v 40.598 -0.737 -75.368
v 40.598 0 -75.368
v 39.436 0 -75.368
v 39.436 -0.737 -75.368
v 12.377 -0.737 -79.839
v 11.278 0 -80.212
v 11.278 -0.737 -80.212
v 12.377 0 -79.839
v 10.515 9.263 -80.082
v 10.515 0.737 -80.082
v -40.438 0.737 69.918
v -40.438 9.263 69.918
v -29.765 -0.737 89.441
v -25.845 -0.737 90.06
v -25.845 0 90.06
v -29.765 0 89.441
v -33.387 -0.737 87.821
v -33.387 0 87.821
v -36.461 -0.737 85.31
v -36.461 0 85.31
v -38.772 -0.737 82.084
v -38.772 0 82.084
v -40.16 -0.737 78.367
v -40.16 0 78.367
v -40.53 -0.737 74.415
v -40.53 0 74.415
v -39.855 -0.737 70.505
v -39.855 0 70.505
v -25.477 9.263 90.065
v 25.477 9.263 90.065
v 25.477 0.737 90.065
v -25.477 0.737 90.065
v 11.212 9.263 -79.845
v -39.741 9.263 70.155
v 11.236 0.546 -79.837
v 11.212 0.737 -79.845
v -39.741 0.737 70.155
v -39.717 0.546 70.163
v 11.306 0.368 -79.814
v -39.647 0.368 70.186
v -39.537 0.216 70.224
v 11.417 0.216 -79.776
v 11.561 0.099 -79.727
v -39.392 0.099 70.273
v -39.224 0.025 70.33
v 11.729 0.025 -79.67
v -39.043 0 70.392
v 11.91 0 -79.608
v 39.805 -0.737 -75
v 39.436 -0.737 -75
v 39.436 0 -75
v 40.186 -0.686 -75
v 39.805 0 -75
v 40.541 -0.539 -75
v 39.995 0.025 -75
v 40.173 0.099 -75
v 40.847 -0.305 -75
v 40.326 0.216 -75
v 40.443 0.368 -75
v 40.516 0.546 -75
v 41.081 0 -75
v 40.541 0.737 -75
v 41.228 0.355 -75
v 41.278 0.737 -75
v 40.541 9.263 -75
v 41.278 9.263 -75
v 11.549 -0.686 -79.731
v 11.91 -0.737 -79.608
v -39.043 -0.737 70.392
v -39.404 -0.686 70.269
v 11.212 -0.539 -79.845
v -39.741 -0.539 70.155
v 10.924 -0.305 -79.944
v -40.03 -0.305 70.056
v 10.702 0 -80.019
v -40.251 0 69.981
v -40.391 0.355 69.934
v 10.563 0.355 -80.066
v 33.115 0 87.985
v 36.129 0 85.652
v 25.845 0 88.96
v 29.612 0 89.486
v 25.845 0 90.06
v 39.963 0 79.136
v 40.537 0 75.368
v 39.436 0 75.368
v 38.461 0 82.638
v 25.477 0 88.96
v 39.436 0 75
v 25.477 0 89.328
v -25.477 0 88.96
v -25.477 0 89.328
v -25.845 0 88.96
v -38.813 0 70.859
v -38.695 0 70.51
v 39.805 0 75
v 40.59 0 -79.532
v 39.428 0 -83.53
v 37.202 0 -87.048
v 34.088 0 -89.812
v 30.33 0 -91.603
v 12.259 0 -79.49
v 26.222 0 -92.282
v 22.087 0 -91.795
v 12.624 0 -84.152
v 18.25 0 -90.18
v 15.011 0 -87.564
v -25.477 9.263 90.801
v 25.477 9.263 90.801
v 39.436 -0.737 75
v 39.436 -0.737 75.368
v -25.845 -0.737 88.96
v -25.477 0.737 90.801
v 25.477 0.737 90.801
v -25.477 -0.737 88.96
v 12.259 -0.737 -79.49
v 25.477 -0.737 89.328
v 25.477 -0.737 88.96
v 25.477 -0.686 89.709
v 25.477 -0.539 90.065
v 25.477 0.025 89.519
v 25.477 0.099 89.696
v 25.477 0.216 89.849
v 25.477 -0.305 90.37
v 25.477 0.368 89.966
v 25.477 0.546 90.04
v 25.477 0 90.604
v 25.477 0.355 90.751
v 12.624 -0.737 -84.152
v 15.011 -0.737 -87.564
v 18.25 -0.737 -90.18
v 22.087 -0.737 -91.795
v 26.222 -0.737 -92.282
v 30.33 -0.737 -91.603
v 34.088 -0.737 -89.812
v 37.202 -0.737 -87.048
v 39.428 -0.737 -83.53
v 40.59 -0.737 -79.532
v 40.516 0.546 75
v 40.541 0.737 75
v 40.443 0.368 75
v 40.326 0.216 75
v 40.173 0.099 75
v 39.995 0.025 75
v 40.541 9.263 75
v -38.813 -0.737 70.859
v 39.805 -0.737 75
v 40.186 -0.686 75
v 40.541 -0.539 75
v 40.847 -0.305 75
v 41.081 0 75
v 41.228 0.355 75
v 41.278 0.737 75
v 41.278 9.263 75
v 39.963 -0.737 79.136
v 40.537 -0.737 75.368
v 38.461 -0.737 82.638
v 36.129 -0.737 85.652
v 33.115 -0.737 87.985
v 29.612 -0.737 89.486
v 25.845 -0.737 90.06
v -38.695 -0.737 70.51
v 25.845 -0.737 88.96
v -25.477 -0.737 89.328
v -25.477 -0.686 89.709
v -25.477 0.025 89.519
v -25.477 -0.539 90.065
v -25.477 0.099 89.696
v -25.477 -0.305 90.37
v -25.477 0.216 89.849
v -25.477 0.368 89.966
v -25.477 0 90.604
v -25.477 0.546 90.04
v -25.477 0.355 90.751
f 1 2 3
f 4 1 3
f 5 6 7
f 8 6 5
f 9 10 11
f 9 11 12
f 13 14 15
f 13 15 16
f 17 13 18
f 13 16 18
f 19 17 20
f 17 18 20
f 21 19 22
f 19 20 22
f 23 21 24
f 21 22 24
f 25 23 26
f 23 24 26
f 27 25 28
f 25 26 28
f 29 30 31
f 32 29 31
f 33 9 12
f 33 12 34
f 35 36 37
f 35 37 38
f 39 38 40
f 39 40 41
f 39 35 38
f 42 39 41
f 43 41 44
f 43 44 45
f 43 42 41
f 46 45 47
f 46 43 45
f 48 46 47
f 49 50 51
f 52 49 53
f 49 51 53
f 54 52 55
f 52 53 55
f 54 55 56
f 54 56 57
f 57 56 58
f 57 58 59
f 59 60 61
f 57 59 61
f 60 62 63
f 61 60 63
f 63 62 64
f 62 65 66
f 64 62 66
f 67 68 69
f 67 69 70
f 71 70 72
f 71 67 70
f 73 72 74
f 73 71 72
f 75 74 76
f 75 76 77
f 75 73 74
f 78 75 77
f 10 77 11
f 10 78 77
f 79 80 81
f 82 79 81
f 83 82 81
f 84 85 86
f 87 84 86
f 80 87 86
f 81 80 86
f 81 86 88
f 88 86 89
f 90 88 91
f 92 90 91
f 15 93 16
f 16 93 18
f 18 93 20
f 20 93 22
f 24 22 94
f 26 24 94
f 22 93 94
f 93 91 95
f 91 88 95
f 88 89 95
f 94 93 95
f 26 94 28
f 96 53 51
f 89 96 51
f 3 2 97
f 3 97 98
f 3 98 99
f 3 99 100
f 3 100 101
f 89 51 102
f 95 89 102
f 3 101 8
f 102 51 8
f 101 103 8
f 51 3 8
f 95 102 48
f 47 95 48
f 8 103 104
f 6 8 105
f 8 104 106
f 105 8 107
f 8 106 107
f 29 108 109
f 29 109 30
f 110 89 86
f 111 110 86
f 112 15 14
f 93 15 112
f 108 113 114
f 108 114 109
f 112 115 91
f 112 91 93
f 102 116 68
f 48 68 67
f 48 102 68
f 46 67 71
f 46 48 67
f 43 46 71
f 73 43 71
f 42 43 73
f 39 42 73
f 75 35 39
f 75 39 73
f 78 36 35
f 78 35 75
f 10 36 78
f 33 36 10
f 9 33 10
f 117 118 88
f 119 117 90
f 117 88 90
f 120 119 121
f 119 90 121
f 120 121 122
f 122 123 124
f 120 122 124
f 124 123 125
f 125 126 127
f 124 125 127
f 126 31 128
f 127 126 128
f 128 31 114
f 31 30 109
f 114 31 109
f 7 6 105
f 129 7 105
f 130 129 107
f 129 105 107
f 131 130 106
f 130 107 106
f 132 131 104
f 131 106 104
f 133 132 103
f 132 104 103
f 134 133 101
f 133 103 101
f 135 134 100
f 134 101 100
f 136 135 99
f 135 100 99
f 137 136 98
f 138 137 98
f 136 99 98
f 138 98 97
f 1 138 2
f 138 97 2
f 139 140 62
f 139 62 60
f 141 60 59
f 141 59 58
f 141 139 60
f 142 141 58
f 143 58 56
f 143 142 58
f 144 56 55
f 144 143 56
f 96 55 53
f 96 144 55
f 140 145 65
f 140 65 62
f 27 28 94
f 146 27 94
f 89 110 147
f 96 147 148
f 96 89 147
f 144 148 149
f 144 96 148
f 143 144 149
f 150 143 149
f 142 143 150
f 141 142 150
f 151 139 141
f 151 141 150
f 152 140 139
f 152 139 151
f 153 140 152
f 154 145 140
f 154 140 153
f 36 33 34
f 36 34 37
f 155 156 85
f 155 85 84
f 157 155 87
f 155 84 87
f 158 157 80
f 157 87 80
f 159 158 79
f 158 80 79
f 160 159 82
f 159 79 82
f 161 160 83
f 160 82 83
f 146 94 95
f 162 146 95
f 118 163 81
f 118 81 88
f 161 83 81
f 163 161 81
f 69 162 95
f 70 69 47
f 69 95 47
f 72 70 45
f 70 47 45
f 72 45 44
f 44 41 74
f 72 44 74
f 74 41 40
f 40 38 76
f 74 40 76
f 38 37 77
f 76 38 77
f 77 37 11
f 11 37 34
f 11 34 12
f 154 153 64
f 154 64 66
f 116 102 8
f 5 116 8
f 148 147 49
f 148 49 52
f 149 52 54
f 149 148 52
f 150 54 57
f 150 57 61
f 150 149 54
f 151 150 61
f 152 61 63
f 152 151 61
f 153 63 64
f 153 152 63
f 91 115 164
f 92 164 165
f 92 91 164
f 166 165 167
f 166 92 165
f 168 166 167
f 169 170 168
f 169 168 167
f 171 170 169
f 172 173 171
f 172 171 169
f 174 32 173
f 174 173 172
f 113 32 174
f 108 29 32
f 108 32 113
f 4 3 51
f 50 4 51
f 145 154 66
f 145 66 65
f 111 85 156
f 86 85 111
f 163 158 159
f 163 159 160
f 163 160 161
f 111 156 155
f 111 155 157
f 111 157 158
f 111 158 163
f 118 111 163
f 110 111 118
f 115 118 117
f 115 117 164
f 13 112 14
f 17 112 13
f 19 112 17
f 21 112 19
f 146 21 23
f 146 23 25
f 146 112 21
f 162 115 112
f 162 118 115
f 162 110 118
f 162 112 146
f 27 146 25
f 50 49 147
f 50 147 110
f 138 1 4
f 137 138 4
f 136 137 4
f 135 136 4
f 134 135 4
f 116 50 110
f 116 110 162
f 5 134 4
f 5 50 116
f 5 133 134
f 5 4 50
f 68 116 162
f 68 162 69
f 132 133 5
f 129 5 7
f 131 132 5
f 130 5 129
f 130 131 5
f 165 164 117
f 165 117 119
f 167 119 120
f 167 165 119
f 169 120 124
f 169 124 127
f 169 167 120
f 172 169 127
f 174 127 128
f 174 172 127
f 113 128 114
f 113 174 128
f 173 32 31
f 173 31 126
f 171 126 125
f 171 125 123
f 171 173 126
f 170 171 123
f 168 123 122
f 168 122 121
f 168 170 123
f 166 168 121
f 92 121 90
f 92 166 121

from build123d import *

# Parameters (mm, degrees)
BASE_FLANGE1_DEPTH            = 0.7366
EDGE_FLANGE1_STRIP_W          = 4.4196
EDGE_FLANGE1_STRIP_H          = 0.7366
EDGE_FLANGE1_STRIP_CUT_DEPTH  = 150
EDGE_FLANGE1_RELIEF_W         = 4.7879
EDGE_FLANGE1_RELIEF_H         = 0.3683
EDGE_FLANGE1_RELIEF_CUT_DEPTH = 0.7366
EDGE_FLANGE1_DEPTH            = 150
EDGE_FLANGE2_STRIP_W          = 4.4196
EDGE_FLANGE2_STRIP_H          = 0.7366
EDGE_FLANGE2_STRIP_CUT_DEPTH  = 50.953389831
EDGE_FLANGE2_RELIEF_W         = 4.7879
EDGE_FLANGE2_RELIEF_H         = 0.3683
EDGE_FLANGE2_RELIEF_CUT_DEPTH = 0.7366
EDGE_FLANGE2_DEPTH            = 50.953389831
EDGE_FLANGE3_STRIP_W          = 4.4196
EDGE_FLANGE3_STRIP_H          = 0.7366
EDGE_FLANGE3_STRIP_CUT_DEPTH  = 158.417953324
EDGE_FLANGE3_RELIEF_W         = 4.7879
EDGE_FLANGE3_RELIEF_H         = 0.3683
EDGE_FLANGE3_RELIEF_CUT_DEPTH = 0.7366
EDGE_FLANGE3_DEPTH            = 158.417953324


# Sheet-metal steps are written as plain solids
with BuildPart() as part:
    # Sketch1 → Base-Flange1 (new body)
    with BuildSketch(Plane(origin=(0, 0, 0), x_dir=(1, 0, 0), z_dir=(0, 1, 0))):
        with BuildLine():
            Line((40.54139599, 75), (40.54139599, -75))
            ThreePointArc((40.54139599, -75), (36.129047202, -85.652352287), (25.476694915, -90.064701075))
            Line((25.476694915, -90.064701075), (-25.476694915, -90.064701075))
            ThreePointArc((-25.476694915, -90.064701075), (-37.722911645, -83.773562235), (-39.740893599, -70.154604826))
            Line((-39.740893599, -70.154604826), (11.212496231, 79.845395174))
            ThreePointArc((11.212496231, 79.845395174), (28.299643698, 92.087147467), (40.54139599, 75))
        make_face()
    extrude(amount=-BASE_FLANGE1_DEPTH)

    # Edge-Flange1 strip (across the edge) → Edge-Flange1 strip cut (cut)
    with BuildSketch(Plane(origin=(40.54139599, 0, 75), x_dir=(-1, 0, 0), z_dir=(0, 0, -1))):
        with Locations((-1.4732, -0.3683)):
            Rectangle(EDGE_FLANGE1_STRIP_W, EDGE_FLANGE1_STRIP_H)
    extrude(amount=EDGE_FLANGE1_STRIP_CUT_DEPTH, mode=Mode.SUBTRACT)

    # Edge-Flange1 relief (on the sheet) → Edge-Flange1 relief cut (cut)
    with BuildSketch(Plane(origin=(39.80479599, 0, 75), x_dir=(-1, 0, 0), z_dir=(0, 1, 0))):
        with Locations((-2.02565, 0.18415)):
            Rectangle(EDGE_FLANGE1_RELIEF_W, EDGE_FLANGE1_RELIEF_H)
        with Locations((-2.02565, -150.18415)):
            Rectangle(EDGE_FLANGE1_RELIEF_W, EDGE_FLANGE1_RELIEF_H)
    extrude(amount=-EDGE_FLANGE1_RELIEF_CUT_DEPTH, mode=Mode.SUBTRACT)

    # Edge-Flange1 section (across the edge) → Edge-Flange1 (add)
    with BuildSketch(Plane(origin=(40.54139599, 0, 75), x_dir=(-1, 0, 0), z_dir=(0, 0, -1))):
        with BuildLine():
            Line((-0.7366, 0.7366), (-0.7366, 9.2634))
            Line((-0.7366, 9.2634), (0, 9.2634))
            Line((0, 9.2634), (0, 0.7366))
            ThreePointArc((0, 0.7366), (0.215745145, 0.215745145), (0.7366, 0))
            Line((0.7366, 0), (0.7366, -0.7366))
            ThreePointArc((0.7366, -0.7366), (-0.30510971, -0.30510971), (-0.7366, 0.7366))
        make_face()
    extrude(amount=EDGE_FLANGE1_DEPTH)

    # Edge-Flange2 strip (across the edge) → Edge-Flange2 strip cut (cut)
    with BuildSketch(Plane(origin=(-25.476694915, 0, 90.064701075), x_dir=(0, 0, -1), z_dir=(1, 0, 0))):
        with Locations((-1.4732, -0.3683)):
            Rectangle(EDGE_FLANGE2_STRIP_W, EDGE_FLANGE2_STRIP_H)
    extrude(amount=EDGE_FLANGE2_STRIP_CUT_DEPTH, mode=Mode.SUBTRACT)

    # Edge-Flange2 relief (on the sheet) → Edge-Flange2 relief cut (cut)
    with BuildSketch(Plane(origin=(-25.476694915, 0, 89.328101075), x_dir=(0, 0, -1), z_dir=(0, 1, 0))):
        with Locations((-2.02565, 0.18415)):
            Rectangle(EDGE_FLANGE2_RELIEF_W, EDGE_FLANGE2_RELIEF_H)
        with Locations((-2.02565, -51.137539831)):
            Rectangle(EDGE_FLANGE2_RELIEF_W, EDGE_FLANGE2_RELIEF_H)
    extrude(amount=-EDGE_FLANGE2_RELIEF_CUT_DEPTH, mode=Mode.SUBTRACT)

    # Edge-Flange2 section (across the edge) → Edge-Flange2 (add)
    with BuildSketch(Plane(origin=(-25.476694915, 0, 90.064701075), x_dir=(0, 0, -1), z_dir=(1, 0, 0))):
        with BuildLine():
            Line((-0.7366, 0.7366), (-0.7366, 9.2634))
            Line((-0.7366, 9.2634), (0, 9.2634))
            Line((0, 9.2634), (0, 0.7366))
            ThreePointArc((0, 0.7366), (0.215745145, 0.215745145), (0.7366, 0))
            Line((0.7366, 0), (0.7366, -0.7366))
            ThreePointArc((0.7366, -0.7366), (-0.30510971, -0.30510971), (-0.7366, 0.7366))
        make_face()
    extrude(amount=EDGE_FLANGE2_DEPTH)

    # Edge-Flange3 strip (across the edge) → Edge-Flange3 strip cut (cut)
    with BuildSketch(Plane(origin=(11.212496231, 0, -79.845395174), x_dir=(0.9468623779885023, 3.4914813388431334e-15, 0.3216389857432692), z_dir=(-0.3216389857432692, 0, 0.9468623779885023))):
        with Locations((-1.4732, -0.3683)):
            Rectangle(EDGE_FLANGE3_STRIP_W, EDGE_FLANGE3_STRIP_H)
    extrude(amount=EDGE_FLANGE3_STRIP_CUT_DEPTH, mode=Mode.SUBTRACT)

    # Edge-Flange3 relief (on the sheet) → Edge-Flange3 relief cut (cut)
    with BuildSketch(Plane(origin=(11.909955059, 0, -79.608475897), x_dir=(0.9468623779885023, 6.982962677686267e-15, 0.3216389857432692), z_dir=(0, 1, 0))):
        with Locations((-2.02565, 0.18415)):
            Rectangle(EDGE_FLANGE3_RELIEF_W, EDGE_FLANGE3_RELIEF_H)
        with Locations((-2.02565, -158.602103324)):
            Rectangle(EDGE_FLANGE3_RELIEF_W, EDGE_FLANGE3_RELIEF_H)
    extrude(amount=-EDGE_FLANGE3_RELIEF_CUT_DEPTH, mode=Mode.SUBTRACT)

    # Edge-Flange3 section (across the edge) → Edge-Flange3 (add)
    with BuildSketch(Plane(origin=(11.212496231, 0, -79.845395174), x_dir=(0.9468623779885023, 3.4914813388431334e-15, 0.3216389857432692), z_dir=(-0.3216389857432692, 0, 0.9468623779885023))):
        with BuildLine():
            Line((-0.7366, 0.7366), (-0.7366, 9.2634))
            Line((-0.7366, 9.2634), (0, 9.2634))
            Line((0, 9.2634), (0, 0.7366))
            ThreePointArc((0, 0.7366), (0.215745145, 0.215745145), (0.7366, 0))
            Line((0.7366, 0), (0.7366, -0.7366))
            ThreePointArc((0.7366, -0.7366), (-0.30510971, -0.30510971), (-0.7366, 0.7366))
        make_face()
    extrude(amount=EDGE_FLANGE3_DEPTH)


solid = part.part
